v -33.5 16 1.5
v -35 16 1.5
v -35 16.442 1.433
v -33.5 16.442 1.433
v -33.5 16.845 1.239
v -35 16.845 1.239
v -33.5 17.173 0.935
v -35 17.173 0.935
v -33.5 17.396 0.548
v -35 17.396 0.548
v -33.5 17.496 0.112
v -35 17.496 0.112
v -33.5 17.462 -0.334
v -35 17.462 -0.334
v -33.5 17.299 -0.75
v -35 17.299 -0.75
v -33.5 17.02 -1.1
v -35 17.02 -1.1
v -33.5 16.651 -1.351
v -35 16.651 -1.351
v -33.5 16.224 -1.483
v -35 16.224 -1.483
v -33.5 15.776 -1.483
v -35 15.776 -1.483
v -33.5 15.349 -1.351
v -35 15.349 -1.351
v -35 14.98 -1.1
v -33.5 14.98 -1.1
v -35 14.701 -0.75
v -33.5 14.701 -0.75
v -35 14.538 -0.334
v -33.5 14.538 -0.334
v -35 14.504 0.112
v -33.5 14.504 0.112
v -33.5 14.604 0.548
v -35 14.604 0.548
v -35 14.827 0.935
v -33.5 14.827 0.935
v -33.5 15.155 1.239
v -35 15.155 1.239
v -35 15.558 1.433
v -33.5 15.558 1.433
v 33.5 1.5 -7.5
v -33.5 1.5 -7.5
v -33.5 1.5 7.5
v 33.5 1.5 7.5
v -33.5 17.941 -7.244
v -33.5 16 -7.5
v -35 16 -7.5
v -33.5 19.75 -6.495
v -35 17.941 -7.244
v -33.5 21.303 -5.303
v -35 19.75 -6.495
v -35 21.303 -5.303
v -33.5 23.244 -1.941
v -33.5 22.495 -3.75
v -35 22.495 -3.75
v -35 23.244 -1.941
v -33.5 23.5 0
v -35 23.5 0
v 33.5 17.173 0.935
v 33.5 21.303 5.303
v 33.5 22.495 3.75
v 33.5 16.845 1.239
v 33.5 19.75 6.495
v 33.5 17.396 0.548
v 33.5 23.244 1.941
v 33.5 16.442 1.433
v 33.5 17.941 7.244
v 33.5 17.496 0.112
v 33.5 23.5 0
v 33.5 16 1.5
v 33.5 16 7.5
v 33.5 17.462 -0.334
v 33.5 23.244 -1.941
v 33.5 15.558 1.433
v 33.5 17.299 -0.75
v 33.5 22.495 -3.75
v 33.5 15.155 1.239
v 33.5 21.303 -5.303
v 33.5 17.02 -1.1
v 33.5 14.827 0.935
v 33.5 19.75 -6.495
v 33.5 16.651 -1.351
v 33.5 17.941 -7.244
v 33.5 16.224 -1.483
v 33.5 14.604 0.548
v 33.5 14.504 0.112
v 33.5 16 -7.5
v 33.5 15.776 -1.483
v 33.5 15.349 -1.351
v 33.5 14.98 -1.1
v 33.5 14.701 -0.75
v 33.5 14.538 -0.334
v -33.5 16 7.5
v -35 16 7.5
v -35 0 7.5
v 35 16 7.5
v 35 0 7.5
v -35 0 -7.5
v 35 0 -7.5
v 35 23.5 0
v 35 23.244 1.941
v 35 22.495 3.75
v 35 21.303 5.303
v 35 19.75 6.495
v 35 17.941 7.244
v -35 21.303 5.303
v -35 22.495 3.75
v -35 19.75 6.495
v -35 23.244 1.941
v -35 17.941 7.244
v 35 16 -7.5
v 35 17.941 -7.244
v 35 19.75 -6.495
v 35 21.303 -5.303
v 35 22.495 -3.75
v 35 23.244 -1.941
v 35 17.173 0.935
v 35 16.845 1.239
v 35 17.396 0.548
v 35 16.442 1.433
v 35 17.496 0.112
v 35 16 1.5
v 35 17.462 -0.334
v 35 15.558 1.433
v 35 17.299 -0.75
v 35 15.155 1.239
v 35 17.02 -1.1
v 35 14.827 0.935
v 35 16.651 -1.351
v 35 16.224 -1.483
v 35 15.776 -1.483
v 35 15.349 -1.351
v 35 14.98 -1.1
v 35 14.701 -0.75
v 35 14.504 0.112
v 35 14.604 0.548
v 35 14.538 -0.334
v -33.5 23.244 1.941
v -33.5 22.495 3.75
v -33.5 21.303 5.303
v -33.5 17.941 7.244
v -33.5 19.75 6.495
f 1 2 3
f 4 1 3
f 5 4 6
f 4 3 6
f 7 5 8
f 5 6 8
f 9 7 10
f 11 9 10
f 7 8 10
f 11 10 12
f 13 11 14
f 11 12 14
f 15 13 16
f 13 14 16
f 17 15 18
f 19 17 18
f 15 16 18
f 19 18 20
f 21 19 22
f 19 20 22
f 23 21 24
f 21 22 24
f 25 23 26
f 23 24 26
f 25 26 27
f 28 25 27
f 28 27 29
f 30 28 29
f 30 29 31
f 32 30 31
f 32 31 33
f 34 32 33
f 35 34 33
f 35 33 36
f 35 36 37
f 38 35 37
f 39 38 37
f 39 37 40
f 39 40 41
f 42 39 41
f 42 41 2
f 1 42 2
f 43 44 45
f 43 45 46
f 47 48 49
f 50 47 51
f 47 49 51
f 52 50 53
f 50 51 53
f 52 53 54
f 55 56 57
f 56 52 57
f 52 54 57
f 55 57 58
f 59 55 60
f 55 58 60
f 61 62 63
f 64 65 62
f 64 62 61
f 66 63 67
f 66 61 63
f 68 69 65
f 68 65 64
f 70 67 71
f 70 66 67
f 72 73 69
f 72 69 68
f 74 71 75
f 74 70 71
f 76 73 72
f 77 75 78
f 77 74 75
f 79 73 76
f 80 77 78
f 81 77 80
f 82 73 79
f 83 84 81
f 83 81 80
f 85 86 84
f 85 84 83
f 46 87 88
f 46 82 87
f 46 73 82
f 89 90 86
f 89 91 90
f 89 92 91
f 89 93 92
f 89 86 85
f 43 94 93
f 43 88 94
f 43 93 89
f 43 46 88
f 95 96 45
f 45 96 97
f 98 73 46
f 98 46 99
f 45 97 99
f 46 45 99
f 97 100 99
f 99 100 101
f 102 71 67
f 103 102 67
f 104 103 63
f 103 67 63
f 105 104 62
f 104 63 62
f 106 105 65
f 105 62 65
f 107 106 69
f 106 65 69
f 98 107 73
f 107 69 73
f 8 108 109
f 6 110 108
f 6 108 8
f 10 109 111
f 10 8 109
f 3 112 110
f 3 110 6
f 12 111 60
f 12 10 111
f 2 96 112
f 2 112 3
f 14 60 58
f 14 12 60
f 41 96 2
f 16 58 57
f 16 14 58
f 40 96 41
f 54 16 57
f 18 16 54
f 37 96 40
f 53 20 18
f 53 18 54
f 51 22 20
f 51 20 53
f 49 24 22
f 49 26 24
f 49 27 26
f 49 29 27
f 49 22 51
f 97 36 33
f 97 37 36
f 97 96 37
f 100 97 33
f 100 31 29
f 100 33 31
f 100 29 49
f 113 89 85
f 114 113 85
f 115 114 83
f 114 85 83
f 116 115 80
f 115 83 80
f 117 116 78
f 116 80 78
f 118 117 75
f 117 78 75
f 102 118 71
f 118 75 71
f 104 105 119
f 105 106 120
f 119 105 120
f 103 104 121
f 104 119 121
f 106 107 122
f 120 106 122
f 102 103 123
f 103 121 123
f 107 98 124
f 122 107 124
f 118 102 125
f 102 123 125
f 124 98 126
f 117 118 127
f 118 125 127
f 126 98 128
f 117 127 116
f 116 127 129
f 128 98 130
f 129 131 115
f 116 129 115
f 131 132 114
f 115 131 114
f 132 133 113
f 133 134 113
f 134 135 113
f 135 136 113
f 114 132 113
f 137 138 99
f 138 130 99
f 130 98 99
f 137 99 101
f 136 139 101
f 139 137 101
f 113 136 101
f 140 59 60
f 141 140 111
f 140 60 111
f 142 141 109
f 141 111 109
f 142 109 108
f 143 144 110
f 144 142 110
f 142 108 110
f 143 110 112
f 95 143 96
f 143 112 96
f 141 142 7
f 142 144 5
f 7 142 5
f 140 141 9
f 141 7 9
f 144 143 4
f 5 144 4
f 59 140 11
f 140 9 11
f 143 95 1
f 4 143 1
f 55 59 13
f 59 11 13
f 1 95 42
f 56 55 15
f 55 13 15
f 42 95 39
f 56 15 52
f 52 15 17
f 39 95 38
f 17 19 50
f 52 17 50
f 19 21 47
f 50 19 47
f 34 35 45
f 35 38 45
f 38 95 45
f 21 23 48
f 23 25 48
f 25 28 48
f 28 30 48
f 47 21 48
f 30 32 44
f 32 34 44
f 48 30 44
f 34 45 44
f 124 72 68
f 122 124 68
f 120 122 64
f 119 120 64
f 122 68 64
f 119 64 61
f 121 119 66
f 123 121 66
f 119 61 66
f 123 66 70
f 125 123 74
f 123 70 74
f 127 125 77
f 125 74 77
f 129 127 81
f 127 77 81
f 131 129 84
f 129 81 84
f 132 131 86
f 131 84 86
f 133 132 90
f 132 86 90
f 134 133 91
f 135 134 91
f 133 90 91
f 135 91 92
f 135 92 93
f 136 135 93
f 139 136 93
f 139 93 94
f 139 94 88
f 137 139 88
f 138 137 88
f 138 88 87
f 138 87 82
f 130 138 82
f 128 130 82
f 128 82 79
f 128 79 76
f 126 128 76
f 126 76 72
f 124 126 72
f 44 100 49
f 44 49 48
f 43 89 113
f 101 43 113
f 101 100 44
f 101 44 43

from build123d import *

# Parameters (mm, degrees)
SKETCH1_W           = 70
SKETCH1_H           = 15
BOSS_EXTRUDE1_DEPTH = 1.5
SKETCH2_W           = 1.5
SKETCH2_H           = 15
BOSS_EXTRUDE2_DEPTH = 22
SKETCH3_R           = 1.5
CUT_EXTRUDE1_DEPTH  = 71


with BuildPart() as part:
    # Sketch1 → Boss-Extrude1 (new body)
    with BuildSketch(Plane(origin=(0, 0, 0), x_dir=(1, 0, 0), z_dir=(0, 1, 0))):
        Rectangle(SKETCH1_W, SKETCH1_H)
    extrude(amount=BOSS_EXTRUDE1_DEPTH)

    # Sketch2 → Boss-Extrude2 (add)
    with BuildSketch(Plane(origin=(0, 1.5, 0), x_dir=(1, 0, 0), z_dir=(0, 1, 0))):
        with Locations((-34.25, 0)):
            Rectangle(SKETCH2_W, SKETCH2_H)
        with Locations((34.25, 0)):
            Rectangle(SKETCH2_W, SKETCH2_H)
    extrude(amount=BOSS_EXTRUDE2_DEPTH)

    # Sketch3 → Cut-Extrude1 (cut, through all)
    with BuildSketch(Plane.ZY.offset(35)):
        with BuildLine():
            Line((7.5, 23.5), (0, 23.5))
            ThreePointArc((0, 23.5), (5.303300859, 21.303300859), (7.5, 16))
            Line((7.5, 16), (7.5, 23.5))
        make_face()
        with BuildLine():
            Line((-7.5, 23.5), (-7.5, 16))
            ThreePointArc((-7.5, 16), (-5.303300859, 21.303300859), (0, 23.5))
            Line((0, 23.5), (-7.5, 23.5))
        make_face()
        with Locations((0, 16)):
            Circle(SKETCH3_R)
    extrude(amount=-CUT_EXTRUDE1_DEPTH, mode=Mode.SUBTRACT)


solid = part.part
